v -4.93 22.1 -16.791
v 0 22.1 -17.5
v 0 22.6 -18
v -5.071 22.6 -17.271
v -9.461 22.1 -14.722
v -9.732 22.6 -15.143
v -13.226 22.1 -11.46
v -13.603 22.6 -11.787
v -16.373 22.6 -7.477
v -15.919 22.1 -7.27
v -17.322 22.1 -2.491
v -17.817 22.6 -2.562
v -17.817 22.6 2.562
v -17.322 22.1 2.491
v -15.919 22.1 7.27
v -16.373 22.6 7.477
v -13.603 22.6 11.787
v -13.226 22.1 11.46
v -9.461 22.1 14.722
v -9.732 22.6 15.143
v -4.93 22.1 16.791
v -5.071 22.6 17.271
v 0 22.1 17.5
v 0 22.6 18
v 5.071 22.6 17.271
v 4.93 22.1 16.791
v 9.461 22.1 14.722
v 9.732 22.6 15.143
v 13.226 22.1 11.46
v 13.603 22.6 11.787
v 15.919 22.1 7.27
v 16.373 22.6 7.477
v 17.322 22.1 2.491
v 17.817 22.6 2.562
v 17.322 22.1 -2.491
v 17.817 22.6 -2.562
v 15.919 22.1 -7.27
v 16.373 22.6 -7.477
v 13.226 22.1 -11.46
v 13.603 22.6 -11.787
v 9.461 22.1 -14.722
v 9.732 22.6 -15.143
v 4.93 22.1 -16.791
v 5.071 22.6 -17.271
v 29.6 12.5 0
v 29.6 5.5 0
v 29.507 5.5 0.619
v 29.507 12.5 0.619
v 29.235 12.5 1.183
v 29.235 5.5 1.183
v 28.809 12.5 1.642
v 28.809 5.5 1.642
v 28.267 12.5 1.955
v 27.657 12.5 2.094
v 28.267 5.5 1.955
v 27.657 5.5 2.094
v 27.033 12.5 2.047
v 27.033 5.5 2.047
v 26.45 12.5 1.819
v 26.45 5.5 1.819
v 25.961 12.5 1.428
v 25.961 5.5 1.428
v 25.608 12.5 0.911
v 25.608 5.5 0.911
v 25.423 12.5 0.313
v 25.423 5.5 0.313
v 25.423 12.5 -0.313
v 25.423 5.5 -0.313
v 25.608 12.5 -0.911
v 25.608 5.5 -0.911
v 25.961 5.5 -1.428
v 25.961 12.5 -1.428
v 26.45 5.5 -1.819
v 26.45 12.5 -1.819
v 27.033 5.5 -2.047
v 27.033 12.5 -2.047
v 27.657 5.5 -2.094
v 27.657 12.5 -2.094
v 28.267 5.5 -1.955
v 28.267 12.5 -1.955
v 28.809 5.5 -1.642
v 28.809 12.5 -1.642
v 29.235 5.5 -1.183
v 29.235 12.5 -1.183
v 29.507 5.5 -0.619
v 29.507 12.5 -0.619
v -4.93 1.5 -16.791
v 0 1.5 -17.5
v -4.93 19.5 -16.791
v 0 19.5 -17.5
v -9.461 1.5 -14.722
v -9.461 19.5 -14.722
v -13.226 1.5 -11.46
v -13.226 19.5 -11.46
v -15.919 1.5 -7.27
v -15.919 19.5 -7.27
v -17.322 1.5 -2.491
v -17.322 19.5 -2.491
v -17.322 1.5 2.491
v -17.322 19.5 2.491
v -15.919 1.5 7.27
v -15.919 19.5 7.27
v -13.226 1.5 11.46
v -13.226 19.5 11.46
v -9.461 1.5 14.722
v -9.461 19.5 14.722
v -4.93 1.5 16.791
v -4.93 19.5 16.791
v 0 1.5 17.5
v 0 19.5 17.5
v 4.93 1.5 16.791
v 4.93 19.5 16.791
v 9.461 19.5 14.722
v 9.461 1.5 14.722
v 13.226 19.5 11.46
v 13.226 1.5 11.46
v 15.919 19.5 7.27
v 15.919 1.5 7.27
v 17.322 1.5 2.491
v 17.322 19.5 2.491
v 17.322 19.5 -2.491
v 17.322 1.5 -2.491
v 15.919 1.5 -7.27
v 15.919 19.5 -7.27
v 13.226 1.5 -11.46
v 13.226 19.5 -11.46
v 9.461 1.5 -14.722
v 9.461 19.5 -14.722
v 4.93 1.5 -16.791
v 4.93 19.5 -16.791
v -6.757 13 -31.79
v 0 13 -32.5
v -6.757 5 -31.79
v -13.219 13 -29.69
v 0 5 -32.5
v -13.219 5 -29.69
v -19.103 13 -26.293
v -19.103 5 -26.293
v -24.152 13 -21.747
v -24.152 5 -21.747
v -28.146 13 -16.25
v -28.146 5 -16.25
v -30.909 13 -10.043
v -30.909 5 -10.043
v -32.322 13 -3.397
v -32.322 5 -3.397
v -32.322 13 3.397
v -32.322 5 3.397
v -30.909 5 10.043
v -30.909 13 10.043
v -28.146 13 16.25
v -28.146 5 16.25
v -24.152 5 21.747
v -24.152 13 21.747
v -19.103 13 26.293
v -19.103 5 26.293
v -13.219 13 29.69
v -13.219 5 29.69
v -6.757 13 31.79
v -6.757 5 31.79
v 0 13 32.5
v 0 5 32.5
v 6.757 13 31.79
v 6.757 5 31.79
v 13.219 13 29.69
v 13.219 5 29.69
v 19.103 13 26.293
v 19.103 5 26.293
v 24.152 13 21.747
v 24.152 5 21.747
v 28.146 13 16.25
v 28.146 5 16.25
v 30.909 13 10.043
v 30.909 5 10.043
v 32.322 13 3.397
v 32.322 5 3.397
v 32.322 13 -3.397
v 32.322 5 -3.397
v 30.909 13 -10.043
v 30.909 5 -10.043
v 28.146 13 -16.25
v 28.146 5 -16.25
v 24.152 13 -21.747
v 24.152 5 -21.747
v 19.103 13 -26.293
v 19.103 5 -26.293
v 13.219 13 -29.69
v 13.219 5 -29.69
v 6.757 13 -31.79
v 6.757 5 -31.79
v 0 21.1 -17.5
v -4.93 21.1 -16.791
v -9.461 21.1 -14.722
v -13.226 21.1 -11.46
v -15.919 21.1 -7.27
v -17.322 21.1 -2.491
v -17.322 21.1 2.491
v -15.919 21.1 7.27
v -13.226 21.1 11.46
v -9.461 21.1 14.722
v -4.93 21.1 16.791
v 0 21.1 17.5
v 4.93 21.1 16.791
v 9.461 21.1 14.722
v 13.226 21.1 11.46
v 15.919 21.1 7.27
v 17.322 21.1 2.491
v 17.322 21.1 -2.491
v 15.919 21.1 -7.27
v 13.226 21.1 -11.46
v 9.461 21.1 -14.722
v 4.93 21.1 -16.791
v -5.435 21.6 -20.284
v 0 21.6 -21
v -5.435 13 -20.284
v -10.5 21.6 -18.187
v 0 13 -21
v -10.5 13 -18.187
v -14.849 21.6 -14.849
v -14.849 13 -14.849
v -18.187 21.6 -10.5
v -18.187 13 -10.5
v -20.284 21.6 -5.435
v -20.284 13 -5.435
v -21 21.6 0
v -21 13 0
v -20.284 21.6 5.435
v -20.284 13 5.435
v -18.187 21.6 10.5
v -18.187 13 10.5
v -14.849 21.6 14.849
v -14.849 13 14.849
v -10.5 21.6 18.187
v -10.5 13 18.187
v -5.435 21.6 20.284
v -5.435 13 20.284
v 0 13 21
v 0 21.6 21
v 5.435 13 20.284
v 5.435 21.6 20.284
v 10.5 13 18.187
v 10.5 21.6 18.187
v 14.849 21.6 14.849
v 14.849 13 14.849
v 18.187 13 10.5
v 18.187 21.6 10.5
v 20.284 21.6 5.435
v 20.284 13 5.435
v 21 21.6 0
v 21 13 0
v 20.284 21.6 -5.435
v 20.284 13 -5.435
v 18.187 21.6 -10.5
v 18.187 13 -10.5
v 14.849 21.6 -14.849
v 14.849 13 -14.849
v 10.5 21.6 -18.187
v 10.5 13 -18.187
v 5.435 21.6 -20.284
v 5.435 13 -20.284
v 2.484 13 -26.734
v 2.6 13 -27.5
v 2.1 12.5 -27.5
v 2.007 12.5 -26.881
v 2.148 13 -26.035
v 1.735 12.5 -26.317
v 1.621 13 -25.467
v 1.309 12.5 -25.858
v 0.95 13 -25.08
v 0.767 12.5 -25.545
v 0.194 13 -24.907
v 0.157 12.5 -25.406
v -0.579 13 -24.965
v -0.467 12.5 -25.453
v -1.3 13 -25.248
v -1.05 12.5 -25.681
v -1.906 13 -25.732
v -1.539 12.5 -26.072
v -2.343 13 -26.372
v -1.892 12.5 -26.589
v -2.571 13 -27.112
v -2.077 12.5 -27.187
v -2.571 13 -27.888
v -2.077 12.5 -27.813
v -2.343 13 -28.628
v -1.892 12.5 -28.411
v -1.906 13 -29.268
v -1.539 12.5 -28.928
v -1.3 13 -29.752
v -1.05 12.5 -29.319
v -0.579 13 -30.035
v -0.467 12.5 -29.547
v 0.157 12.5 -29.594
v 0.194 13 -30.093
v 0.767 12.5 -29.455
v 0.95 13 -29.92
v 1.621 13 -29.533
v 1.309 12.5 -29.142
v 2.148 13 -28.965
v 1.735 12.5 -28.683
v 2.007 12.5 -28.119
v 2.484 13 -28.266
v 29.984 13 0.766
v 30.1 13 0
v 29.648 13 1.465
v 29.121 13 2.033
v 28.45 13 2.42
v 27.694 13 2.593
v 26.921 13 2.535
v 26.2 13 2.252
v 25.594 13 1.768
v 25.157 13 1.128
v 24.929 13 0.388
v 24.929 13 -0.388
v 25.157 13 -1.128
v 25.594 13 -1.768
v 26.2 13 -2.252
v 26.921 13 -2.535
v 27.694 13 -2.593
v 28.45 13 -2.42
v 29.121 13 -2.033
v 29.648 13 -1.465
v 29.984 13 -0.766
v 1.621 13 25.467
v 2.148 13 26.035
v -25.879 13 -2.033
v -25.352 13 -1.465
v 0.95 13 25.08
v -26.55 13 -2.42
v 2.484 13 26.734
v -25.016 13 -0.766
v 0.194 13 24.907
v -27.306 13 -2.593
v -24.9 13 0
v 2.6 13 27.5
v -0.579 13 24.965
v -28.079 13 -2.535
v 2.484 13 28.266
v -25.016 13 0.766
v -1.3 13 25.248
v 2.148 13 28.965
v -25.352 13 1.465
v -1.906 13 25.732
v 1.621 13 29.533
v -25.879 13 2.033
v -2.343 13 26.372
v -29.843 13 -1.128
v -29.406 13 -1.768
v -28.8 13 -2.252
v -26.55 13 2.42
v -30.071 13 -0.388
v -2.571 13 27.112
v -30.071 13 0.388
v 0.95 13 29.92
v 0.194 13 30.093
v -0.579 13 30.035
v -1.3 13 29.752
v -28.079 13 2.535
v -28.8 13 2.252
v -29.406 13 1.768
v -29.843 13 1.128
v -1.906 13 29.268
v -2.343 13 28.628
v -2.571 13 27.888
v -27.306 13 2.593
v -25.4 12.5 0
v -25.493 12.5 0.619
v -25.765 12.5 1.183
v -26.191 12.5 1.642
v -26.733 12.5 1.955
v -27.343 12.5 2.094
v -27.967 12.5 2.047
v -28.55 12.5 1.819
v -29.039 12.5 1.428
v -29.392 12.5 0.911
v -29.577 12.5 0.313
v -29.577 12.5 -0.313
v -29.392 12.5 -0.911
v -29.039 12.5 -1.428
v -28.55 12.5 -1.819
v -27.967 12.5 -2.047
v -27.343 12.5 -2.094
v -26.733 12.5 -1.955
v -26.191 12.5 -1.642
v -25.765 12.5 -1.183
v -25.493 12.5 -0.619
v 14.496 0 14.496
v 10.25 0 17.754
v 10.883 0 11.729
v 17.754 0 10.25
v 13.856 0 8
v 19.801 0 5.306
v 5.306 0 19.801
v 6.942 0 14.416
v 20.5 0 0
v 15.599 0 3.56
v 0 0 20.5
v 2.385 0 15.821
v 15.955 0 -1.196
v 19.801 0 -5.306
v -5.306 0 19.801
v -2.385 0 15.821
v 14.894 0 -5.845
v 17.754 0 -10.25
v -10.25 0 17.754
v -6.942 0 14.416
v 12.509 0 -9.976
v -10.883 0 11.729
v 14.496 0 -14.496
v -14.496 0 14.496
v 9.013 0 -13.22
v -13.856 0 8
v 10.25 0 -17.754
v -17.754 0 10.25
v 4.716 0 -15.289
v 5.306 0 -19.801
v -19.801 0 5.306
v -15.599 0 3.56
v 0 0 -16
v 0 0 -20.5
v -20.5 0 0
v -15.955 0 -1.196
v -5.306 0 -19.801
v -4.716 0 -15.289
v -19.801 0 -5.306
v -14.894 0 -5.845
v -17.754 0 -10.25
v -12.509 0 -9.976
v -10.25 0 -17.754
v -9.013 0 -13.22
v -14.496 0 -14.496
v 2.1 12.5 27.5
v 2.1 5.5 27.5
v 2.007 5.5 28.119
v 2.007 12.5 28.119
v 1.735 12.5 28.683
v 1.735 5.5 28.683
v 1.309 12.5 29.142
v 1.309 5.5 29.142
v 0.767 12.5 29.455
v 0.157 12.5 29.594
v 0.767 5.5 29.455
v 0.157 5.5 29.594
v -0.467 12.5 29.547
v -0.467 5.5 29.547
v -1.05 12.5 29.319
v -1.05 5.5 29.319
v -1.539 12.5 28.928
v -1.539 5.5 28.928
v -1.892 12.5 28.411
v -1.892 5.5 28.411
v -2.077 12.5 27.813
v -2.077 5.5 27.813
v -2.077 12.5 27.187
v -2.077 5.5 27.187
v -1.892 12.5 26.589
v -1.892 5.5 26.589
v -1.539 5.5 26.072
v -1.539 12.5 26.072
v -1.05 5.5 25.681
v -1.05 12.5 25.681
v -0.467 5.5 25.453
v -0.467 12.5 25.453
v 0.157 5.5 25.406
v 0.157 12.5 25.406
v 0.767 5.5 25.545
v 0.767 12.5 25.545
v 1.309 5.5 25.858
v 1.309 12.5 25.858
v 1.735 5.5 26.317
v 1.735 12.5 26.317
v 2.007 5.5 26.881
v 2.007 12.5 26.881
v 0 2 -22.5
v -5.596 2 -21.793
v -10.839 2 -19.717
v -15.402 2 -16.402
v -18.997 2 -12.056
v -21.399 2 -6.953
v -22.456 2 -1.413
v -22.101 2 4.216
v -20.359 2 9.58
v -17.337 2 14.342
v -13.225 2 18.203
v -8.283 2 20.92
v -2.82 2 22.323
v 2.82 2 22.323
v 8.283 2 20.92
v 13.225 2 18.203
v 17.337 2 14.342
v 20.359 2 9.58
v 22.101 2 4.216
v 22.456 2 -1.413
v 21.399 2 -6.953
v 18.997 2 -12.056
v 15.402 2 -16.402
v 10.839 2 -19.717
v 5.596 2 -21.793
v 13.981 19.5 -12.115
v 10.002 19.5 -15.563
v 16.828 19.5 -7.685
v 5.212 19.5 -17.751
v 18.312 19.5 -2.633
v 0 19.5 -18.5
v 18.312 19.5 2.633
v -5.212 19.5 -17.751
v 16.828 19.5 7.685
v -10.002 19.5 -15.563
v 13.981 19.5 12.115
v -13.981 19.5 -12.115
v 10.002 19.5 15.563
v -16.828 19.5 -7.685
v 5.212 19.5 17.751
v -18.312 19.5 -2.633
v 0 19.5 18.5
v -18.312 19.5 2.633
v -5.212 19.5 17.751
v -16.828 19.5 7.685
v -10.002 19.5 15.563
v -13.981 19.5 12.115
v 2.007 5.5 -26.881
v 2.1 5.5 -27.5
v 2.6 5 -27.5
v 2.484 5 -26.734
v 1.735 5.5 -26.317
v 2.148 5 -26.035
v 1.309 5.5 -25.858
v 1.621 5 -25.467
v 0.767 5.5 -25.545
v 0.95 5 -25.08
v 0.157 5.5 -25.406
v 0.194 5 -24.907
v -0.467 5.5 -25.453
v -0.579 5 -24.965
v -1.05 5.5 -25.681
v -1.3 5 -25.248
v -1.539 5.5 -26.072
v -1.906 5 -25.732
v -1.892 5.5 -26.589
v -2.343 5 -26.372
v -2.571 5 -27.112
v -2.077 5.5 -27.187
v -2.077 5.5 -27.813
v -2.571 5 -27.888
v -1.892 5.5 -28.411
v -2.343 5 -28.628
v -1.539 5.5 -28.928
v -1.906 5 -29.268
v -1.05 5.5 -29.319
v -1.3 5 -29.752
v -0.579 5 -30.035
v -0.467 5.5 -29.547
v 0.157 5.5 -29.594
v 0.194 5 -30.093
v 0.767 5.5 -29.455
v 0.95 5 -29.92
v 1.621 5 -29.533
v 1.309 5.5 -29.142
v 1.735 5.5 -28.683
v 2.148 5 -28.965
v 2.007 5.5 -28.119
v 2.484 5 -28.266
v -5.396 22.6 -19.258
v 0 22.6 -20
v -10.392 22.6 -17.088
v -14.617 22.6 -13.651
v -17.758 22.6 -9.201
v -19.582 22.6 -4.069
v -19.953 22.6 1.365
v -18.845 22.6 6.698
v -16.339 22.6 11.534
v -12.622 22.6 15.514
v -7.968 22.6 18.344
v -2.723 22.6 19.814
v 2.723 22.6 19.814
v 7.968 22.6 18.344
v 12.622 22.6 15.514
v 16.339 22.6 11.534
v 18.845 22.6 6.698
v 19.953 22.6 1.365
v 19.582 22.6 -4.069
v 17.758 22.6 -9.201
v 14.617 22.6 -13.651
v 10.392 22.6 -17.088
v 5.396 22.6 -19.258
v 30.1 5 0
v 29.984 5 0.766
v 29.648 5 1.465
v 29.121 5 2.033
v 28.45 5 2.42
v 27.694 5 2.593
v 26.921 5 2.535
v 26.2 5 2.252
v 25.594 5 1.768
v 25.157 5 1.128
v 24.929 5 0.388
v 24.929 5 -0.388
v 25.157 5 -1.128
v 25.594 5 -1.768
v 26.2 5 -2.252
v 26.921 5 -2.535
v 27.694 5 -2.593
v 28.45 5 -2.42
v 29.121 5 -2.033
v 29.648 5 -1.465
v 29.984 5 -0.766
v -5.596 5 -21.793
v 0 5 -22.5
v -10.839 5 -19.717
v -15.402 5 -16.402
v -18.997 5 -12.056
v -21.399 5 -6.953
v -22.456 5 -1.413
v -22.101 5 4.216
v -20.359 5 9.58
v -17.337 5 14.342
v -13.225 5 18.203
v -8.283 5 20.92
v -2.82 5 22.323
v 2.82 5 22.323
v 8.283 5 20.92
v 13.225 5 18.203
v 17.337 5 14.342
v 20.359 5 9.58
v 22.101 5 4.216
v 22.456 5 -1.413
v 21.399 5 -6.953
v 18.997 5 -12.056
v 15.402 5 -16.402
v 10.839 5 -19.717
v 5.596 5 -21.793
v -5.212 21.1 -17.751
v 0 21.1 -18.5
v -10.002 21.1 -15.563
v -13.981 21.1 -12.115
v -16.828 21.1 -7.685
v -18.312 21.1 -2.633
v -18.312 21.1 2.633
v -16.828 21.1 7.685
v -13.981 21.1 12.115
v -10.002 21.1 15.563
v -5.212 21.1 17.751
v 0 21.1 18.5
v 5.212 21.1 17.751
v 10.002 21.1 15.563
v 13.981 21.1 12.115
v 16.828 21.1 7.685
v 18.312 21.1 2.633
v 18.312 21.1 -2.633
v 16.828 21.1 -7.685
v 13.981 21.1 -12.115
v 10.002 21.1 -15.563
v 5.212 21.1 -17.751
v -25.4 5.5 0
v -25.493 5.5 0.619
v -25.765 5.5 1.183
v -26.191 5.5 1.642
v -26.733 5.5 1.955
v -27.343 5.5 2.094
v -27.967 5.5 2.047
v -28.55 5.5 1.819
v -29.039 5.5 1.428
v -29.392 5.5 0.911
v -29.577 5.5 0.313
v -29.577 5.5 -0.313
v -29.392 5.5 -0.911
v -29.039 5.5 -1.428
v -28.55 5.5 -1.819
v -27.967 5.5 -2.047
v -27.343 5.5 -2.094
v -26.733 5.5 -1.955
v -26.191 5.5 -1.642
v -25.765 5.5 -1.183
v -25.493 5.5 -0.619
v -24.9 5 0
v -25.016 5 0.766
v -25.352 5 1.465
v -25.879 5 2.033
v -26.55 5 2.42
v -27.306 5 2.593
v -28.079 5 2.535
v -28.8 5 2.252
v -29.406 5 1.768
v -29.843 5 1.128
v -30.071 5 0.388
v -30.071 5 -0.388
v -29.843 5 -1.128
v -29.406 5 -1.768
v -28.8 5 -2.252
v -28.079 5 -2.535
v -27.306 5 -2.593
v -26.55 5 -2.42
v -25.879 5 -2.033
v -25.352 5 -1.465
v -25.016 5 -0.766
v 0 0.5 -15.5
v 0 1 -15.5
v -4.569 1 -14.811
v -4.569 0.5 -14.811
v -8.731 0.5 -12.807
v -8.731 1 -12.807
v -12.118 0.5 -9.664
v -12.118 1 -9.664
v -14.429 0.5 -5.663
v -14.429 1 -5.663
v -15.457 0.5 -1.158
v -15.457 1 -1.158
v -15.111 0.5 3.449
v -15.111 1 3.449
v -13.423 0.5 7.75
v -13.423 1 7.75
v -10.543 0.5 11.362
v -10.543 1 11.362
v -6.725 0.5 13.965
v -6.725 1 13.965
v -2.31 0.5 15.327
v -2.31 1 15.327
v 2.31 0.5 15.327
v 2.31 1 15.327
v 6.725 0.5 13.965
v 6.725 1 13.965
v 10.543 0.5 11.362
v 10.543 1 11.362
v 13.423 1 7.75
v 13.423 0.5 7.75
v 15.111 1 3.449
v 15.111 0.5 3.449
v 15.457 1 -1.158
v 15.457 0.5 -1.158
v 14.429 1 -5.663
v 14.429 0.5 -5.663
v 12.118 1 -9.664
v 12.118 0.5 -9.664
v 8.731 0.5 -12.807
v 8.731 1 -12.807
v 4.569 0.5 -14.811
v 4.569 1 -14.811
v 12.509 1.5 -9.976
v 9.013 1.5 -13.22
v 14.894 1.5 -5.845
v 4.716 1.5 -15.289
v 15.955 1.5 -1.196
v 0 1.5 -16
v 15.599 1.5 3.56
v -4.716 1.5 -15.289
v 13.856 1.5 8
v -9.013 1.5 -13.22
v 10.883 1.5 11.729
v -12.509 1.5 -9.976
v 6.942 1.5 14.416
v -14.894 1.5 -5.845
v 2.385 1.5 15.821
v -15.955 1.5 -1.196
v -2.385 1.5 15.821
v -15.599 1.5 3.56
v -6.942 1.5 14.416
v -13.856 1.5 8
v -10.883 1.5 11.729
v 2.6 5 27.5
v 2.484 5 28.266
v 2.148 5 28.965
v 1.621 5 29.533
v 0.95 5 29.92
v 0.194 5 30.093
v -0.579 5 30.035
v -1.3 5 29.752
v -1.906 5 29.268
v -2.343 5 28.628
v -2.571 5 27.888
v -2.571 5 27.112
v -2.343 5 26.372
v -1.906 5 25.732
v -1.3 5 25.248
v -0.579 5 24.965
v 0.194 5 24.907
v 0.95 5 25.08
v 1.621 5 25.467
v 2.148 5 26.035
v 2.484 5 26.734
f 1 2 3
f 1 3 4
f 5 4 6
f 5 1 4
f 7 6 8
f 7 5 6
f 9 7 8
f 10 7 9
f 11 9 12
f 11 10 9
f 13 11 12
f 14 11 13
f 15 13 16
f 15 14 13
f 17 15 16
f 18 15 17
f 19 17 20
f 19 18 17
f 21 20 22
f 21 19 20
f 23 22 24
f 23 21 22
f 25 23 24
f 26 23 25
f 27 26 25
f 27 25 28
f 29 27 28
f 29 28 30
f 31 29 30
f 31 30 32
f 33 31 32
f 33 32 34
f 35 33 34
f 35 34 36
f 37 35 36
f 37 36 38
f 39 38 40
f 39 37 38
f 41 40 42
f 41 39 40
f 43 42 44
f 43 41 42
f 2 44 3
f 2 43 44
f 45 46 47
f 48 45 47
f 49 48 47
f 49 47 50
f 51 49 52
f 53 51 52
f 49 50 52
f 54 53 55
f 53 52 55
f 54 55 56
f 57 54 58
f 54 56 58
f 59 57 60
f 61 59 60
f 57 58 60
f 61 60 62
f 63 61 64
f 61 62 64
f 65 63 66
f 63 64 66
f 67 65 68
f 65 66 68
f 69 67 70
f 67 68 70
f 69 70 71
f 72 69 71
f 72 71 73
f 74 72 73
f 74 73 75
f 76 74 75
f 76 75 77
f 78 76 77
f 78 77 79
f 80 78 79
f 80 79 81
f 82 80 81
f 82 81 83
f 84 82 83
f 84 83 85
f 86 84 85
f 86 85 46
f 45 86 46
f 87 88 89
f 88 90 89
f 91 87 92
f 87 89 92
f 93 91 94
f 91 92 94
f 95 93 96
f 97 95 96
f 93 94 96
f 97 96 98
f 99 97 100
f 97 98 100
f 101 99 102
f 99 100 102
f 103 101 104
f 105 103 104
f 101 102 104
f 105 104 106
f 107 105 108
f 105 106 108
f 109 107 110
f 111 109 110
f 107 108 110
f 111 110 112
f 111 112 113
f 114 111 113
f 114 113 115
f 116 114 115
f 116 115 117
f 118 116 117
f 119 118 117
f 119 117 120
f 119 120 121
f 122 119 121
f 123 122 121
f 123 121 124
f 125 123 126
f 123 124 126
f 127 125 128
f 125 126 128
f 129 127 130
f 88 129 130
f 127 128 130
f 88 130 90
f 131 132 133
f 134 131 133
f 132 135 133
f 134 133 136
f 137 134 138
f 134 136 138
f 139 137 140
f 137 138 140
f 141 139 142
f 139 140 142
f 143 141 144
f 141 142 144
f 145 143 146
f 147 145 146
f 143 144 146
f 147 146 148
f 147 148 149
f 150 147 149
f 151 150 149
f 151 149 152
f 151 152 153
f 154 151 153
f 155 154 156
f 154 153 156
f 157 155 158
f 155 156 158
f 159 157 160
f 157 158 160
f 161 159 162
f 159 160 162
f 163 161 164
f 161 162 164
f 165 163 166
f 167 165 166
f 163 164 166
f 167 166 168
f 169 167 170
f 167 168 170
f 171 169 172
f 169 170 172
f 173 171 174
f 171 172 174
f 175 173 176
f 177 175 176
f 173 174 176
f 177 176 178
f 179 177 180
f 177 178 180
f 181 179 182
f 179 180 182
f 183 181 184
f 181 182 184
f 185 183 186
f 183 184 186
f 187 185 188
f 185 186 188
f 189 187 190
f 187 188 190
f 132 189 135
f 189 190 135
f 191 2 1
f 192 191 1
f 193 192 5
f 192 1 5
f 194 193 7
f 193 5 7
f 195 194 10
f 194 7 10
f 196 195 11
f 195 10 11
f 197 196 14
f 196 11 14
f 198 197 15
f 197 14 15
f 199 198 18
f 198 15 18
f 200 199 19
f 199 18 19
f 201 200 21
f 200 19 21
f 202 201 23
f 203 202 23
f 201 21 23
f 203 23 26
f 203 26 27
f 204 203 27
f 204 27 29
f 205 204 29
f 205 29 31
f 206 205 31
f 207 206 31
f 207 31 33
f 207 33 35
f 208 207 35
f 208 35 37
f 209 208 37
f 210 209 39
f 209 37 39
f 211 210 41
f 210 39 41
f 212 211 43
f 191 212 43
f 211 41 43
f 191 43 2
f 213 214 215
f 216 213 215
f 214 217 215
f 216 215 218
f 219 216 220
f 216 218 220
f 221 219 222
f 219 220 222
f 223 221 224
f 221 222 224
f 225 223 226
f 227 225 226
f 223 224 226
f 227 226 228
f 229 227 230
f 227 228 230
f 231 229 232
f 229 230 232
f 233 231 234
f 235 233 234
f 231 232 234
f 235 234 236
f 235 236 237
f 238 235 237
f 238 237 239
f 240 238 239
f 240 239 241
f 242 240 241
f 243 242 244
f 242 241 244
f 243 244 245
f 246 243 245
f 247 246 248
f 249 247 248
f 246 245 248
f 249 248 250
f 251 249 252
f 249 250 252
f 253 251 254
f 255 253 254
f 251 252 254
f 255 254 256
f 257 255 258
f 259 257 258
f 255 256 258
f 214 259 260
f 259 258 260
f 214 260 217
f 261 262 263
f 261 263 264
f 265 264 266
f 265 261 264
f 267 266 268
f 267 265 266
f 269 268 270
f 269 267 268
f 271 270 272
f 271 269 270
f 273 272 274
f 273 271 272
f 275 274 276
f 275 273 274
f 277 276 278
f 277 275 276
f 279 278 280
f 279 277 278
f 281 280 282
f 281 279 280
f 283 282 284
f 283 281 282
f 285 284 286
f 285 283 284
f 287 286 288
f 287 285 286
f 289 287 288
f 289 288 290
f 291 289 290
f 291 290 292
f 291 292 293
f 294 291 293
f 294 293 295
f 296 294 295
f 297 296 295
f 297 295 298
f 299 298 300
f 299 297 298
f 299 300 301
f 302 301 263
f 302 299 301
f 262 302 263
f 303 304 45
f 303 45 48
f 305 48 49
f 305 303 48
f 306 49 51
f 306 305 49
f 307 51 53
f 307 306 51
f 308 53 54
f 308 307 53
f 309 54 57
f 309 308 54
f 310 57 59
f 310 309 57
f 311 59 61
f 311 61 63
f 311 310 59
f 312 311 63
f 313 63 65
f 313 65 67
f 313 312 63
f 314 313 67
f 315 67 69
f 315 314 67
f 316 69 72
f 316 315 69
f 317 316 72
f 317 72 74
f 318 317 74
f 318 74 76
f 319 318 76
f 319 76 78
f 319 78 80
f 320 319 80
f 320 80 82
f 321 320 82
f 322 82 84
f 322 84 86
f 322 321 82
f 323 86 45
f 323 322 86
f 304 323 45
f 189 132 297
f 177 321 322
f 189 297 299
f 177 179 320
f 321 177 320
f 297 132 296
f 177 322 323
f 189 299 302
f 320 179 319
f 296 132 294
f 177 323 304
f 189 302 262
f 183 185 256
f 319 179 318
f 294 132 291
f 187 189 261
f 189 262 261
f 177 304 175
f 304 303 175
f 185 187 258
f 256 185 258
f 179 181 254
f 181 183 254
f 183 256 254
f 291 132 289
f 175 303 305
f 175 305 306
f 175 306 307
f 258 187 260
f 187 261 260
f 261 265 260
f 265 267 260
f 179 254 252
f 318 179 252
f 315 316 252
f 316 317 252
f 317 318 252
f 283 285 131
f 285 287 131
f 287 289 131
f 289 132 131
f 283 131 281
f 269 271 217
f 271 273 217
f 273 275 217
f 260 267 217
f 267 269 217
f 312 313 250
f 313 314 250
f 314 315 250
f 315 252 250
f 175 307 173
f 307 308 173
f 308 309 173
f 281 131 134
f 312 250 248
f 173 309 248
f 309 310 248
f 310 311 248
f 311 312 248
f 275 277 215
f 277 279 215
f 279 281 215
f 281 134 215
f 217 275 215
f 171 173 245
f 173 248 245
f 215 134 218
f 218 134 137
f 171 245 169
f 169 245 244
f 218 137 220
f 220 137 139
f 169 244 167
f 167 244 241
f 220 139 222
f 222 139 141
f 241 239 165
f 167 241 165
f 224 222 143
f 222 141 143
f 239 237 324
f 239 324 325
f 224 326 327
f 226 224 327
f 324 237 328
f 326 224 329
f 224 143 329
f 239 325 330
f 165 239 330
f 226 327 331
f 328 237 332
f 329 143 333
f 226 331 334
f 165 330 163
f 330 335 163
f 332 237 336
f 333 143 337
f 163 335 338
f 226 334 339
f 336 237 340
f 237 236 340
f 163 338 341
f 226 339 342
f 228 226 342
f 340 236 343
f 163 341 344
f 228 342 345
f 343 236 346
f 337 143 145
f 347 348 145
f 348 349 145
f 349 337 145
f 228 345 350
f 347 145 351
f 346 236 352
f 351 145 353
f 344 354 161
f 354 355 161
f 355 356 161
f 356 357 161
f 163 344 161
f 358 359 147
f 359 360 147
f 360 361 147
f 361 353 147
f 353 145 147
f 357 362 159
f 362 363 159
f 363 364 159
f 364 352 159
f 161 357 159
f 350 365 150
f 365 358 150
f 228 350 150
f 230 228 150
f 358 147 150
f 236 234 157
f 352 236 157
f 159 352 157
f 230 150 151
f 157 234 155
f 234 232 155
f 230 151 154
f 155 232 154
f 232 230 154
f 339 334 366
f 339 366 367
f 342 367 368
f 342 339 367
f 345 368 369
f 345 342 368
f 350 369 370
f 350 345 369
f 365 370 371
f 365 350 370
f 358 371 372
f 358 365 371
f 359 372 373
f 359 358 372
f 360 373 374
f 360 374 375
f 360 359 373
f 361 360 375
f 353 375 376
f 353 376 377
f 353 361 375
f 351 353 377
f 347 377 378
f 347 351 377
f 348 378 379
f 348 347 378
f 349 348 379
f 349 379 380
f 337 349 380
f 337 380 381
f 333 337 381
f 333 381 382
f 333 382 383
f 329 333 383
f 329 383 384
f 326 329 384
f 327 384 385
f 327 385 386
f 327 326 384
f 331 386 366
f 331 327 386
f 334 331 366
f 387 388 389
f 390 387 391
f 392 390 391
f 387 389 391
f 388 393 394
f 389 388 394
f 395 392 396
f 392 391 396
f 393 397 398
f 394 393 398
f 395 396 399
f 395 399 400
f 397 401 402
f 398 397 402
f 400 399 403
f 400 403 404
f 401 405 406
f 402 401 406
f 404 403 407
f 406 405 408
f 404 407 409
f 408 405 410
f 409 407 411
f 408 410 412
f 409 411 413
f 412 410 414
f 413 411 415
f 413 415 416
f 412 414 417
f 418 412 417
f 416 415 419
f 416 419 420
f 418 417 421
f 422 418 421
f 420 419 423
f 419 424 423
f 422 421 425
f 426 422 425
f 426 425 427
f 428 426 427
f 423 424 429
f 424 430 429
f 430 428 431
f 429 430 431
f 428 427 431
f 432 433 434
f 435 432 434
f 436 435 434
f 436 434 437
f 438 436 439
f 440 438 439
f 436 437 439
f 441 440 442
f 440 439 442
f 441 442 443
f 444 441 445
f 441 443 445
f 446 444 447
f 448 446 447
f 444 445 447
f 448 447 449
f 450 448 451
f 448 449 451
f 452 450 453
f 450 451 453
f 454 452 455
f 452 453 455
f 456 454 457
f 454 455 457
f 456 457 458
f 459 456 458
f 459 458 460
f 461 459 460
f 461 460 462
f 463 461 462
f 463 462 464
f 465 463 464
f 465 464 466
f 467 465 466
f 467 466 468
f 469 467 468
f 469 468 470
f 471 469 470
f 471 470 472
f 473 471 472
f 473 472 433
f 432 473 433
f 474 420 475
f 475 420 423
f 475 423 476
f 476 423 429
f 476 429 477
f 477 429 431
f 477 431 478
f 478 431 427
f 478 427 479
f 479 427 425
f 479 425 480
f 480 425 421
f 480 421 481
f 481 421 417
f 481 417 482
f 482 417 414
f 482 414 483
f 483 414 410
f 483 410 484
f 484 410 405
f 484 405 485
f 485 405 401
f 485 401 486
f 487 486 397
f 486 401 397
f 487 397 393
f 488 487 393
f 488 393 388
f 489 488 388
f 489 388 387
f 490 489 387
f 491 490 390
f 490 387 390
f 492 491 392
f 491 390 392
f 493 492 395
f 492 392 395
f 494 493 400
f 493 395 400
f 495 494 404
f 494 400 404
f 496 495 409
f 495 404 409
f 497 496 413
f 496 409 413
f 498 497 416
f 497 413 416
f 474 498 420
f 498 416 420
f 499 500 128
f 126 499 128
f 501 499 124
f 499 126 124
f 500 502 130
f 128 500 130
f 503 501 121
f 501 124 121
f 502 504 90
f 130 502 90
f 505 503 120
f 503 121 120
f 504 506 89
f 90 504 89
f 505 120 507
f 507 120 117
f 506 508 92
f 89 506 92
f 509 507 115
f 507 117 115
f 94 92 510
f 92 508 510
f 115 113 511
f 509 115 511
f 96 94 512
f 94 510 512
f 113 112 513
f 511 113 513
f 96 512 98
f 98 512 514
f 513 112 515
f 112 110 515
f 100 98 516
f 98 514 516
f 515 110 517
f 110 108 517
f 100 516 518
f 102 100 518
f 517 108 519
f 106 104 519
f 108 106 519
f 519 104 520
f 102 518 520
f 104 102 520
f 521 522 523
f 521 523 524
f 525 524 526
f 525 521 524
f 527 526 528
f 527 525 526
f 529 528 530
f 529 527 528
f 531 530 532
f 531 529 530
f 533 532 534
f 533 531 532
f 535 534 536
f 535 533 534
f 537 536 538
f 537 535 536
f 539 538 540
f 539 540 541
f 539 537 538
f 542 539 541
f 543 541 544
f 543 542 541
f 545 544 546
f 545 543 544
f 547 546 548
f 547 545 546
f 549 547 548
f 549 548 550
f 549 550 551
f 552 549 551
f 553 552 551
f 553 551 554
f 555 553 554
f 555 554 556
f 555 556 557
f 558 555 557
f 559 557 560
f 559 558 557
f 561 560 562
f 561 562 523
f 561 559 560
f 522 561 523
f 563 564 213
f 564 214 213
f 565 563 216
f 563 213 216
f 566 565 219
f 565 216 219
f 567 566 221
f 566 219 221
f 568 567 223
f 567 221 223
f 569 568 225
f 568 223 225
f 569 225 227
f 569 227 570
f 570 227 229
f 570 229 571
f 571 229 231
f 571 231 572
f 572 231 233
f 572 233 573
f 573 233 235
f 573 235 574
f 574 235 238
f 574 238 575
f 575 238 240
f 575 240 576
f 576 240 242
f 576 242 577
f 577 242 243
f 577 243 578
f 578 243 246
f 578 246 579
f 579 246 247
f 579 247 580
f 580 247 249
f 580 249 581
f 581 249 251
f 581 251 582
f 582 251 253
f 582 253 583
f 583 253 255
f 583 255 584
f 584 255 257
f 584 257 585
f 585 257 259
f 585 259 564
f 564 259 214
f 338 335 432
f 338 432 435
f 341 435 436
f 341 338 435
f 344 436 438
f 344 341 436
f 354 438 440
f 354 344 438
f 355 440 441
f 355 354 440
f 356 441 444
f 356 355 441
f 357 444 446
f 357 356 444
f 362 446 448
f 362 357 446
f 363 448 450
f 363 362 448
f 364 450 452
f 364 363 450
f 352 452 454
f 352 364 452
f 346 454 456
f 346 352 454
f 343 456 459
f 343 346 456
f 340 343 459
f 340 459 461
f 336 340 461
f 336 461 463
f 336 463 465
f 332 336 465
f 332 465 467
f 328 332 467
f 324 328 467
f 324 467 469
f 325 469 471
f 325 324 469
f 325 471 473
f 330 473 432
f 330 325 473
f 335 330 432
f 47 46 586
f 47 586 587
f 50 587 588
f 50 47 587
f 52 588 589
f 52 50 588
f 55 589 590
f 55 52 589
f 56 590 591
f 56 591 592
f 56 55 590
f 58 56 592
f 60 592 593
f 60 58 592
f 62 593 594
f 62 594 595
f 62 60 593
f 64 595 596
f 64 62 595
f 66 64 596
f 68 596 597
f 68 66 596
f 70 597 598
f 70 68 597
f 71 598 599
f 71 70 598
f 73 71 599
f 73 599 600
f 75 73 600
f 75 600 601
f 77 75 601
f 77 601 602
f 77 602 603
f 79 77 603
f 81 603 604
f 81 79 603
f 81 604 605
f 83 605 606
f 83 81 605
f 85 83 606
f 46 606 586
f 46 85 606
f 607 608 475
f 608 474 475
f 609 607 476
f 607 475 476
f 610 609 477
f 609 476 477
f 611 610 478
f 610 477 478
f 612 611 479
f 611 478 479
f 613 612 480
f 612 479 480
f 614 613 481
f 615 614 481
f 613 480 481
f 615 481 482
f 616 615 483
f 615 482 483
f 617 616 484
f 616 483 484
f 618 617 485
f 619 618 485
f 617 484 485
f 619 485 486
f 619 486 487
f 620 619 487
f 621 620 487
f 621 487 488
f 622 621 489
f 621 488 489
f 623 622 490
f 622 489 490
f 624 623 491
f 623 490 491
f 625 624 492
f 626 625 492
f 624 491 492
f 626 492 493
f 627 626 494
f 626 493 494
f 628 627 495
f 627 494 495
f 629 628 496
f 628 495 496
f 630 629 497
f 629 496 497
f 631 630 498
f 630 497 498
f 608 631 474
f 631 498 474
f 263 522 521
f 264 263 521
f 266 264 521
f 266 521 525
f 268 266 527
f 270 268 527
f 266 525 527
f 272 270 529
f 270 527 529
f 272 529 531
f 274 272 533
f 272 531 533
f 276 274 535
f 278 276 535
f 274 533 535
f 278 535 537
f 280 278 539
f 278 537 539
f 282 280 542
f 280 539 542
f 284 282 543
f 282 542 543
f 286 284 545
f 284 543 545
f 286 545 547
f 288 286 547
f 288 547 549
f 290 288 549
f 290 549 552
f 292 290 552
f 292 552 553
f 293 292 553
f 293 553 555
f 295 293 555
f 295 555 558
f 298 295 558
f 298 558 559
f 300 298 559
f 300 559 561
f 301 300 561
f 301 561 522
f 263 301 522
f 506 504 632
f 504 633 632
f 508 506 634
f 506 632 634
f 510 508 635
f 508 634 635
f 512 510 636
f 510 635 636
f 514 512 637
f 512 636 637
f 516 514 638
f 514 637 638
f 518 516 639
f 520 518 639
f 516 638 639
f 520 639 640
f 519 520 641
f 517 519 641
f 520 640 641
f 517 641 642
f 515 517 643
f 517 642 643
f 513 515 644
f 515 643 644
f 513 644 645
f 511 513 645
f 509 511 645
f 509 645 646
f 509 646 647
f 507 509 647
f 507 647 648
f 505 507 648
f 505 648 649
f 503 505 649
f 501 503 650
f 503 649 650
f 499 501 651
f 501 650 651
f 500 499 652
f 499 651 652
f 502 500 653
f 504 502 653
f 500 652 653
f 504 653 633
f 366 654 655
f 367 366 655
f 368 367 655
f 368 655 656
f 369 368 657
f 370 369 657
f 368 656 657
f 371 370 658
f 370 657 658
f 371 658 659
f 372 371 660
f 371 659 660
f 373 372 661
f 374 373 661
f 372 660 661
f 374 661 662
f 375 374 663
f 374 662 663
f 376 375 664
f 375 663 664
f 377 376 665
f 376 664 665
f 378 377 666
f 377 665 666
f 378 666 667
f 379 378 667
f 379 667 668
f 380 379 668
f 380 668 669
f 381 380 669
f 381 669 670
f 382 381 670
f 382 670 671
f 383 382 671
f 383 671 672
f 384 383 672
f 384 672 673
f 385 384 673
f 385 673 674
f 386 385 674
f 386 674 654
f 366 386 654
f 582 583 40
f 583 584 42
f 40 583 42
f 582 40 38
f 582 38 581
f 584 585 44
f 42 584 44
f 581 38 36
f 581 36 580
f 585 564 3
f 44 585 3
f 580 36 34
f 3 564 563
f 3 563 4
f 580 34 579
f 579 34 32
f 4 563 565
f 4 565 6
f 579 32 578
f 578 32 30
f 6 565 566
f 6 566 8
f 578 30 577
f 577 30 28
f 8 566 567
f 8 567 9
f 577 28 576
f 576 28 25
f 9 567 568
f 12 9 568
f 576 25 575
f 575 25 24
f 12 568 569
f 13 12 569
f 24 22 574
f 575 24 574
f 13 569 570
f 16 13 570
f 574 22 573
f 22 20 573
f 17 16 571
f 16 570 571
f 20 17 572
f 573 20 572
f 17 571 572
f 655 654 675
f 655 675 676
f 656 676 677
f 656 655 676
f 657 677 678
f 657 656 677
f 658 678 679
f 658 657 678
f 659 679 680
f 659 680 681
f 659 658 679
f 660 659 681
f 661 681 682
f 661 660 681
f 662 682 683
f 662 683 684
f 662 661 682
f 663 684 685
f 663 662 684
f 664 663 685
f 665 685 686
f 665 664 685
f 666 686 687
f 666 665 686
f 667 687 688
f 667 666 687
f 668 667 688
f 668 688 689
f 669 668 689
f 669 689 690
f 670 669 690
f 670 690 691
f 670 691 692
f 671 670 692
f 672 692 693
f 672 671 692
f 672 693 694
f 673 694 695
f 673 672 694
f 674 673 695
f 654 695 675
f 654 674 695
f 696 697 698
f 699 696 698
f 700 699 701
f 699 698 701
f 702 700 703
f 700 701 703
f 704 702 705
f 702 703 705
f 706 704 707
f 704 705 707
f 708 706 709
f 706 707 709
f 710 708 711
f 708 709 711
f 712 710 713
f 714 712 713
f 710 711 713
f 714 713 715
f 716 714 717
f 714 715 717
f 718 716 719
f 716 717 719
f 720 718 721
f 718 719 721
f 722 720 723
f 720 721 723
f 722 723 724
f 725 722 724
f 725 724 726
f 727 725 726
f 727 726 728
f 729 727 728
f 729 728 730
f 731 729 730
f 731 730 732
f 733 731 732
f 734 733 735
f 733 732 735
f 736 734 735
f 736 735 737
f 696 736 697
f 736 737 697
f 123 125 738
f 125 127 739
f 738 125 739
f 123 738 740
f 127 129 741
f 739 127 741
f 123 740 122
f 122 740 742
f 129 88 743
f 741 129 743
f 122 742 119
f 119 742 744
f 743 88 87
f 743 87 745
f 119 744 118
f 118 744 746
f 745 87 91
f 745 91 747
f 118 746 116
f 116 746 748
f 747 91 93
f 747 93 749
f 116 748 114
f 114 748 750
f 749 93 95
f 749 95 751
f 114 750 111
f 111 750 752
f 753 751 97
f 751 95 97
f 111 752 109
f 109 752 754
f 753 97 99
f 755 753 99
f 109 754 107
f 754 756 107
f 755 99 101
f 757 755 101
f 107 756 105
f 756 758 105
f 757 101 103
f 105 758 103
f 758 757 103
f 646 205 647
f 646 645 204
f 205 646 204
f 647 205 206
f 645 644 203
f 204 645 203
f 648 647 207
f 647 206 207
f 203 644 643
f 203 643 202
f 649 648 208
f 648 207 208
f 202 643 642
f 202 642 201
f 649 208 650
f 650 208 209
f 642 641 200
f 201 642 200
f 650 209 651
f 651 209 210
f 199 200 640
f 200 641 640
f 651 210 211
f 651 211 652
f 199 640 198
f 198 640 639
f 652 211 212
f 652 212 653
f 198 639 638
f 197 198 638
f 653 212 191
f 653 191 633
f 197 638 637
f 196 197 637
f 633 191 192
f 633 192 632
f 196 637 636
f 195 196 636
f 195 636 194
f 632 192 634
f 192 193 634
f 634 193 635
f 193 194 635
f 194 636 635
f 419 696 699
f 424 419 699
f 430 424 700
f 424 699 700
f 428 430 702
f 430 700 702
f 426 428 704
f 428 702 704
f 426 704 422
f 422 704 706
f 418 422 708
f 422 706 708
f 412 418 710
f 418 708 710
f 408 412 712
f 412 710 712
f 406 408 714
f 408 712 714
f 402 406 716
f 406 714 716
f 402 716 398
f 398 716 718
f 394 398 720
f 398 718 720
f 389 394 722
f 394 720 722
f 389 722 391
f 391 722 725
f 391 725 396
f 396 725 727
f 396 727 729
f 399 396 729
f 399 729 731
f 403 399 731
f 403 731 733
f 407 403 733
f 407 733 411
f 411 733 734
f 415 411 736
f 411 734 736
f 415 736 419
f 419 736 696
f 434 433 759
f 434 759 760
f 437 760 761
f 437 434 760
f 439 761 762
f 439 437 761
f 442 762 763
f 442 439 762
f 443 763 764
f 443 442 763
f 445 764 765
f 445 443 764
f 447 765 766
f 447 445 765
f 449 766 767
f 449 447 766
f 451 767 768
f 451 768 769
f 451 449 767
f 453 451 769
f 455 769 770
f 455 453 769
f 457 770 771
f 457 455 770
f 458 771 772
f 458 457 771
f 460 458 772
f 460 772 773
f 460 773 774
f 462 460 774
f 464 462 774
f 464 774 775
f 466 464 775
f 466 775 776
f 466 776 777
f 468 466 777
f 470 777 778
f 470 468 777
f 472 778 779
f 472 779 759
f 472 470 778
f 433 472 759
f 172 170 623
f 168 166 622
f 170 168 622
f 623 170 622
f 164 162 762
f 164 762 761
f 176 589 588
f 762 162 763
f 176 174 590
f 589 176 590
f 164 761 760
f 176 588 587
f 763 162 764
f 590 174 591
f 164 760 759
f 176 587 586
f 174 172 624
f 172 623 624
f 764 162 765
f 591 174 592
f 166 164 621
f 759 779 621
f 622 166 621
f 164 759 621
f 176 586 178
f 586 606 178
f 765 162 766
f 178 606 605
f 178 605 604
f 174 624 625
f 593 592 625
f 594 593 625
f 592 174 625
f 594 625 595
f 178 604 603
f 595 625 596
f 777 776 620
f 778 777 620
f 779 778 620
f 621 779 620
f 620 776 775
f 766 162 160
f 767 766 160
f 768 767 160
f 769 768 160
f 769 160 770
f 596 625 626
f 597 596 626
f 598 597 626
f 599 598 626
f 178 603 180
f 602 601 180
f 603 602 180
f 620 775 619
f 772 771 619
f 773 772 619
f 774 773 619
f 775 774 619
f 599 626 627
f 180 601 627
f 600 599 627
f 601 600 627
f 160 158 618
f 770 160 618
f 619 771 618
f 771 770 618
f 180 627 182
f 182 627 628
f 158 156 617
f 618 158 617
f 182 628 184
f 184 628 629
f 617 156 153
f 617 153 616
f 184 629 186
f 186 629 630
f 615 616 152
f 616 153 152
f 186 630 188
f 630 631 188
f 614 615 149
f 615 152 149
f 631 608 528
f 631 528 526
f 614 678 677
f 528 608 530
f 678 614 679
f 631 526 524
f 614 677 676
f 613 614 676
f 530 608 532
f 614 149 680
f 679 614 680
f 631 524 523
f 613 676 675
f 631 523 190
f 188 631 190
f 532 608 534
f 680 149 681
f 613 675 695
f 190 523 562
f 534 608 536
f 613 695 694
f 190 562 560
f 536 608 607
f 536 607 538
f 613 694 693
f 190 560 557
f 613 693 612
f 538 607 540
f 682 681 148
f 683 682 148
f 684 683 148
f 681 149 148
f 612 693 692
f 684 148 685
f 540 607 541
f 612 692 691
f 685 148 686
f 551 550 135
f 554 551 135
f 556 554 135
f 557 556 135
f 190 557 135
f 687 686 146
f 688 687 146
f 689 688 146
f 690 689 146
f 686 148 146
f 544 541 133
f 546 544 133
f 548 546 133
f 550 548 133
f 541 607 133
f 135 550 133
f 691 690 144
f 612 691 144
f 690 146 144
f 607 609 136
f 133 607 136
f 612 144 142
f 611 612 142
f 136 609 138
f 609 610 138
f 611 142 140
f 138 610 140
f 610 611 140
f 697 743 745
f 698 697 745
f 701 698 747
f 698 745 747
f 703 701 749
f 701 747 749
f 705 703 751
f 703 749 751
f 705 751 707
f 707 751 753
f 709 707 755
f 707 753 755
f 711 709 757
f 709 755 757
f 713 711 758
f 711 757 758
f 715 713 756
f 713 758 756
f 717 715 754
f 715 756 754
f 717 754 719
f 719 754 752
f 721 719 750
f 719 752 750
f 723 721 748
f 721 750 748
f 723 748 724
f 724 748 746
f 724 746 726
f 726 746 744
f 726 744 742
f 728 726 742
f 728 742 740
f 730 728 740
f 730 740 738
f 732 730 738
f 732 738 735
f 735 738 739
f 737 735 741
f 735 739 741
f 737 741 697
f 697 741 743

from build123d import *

# Parameters (mm, degrees)
SKETCH_2_R          = 2.1
CUT_EXTRUDE_1_DEPTH = 50.216460661
CHAMFER_1_SIZE      = 0.5
CHAMFER_2_SIZE      = 0.5


with BuildPart() as part:
    # Эскиз1 → Повернуть1 (revolve)
    with BuildSketch(Plane.XY, mode=Mode.PRIVATE) as revolve_1_sk:
        Polygon((-22.5, 5), (-22.5, 2), (-20.5, 0), (-15.5, 0), (-15.5, 1.5), (-17.5, 1.5), (-17.5, 19.5), (-18.5, 19.5), (-18.5, 21.1), (-17.5, 21.1), (-17.5, 22.6), (-20, 22.6), (-21, 21.6), (-21, 13), (-32.5, 13), (-32.5, 5), align=None)
    revolve(revolve_1_sk.sketch.rotate(Axis((0, 0, 0), (0, 1, 0)), 270), axis=Axis((0, 0, 0), (0, 1, 0)))

    # Эскиз2 → Вырез-Вытянуть1 (cut, through all)
    with BuildSketch(Plane.XZ.offset(-5)):
        with Locations((0, 27.5)):
            Circle(SKETCH_2_R)
        with Locations((27.5, 0)):
            Circle(SKETCH_2_R)
        with Locations((0, -27.5)):
            Circle(SKETCH_2_R)
        with Locations((-27.5, 0)):
            Circle(SKETCH_2_R)
    extrude(amount=-CUT_EXTRUDE_1_DEPTH, mode=Mode.SUBTRACT)

    # Фаска1
    chamfer_1_edges = [part.edges().sort_by_distance(p)[0] for p in [
        (0, 0, 15.5),
        (0, 1.5, 15.5),
        (0, 22.6, 17.5),
    ]]
    chamfer(chamfer_1_edges, length=CHAMFER_1_SIZE)

    # Фаска2
    chamfer_2_edges = [part.edges().sort_by_distance(p)[0] for p in [
        (-2.1, 13, 27.5),
        (-2.1, 5, 27.5),
        (25.4, 13, 0),
        (25.4, 5, 0),
        (-2.1, 13, -27.5),
        (-2.1, 5, -27.5),
        (-29.6, 13, 0),
        (-29.6, 5, 0),
    ]]
    chamfer(chamfer_2_edges, length=CHAMFER_2_SIZE)


solid = part.part
